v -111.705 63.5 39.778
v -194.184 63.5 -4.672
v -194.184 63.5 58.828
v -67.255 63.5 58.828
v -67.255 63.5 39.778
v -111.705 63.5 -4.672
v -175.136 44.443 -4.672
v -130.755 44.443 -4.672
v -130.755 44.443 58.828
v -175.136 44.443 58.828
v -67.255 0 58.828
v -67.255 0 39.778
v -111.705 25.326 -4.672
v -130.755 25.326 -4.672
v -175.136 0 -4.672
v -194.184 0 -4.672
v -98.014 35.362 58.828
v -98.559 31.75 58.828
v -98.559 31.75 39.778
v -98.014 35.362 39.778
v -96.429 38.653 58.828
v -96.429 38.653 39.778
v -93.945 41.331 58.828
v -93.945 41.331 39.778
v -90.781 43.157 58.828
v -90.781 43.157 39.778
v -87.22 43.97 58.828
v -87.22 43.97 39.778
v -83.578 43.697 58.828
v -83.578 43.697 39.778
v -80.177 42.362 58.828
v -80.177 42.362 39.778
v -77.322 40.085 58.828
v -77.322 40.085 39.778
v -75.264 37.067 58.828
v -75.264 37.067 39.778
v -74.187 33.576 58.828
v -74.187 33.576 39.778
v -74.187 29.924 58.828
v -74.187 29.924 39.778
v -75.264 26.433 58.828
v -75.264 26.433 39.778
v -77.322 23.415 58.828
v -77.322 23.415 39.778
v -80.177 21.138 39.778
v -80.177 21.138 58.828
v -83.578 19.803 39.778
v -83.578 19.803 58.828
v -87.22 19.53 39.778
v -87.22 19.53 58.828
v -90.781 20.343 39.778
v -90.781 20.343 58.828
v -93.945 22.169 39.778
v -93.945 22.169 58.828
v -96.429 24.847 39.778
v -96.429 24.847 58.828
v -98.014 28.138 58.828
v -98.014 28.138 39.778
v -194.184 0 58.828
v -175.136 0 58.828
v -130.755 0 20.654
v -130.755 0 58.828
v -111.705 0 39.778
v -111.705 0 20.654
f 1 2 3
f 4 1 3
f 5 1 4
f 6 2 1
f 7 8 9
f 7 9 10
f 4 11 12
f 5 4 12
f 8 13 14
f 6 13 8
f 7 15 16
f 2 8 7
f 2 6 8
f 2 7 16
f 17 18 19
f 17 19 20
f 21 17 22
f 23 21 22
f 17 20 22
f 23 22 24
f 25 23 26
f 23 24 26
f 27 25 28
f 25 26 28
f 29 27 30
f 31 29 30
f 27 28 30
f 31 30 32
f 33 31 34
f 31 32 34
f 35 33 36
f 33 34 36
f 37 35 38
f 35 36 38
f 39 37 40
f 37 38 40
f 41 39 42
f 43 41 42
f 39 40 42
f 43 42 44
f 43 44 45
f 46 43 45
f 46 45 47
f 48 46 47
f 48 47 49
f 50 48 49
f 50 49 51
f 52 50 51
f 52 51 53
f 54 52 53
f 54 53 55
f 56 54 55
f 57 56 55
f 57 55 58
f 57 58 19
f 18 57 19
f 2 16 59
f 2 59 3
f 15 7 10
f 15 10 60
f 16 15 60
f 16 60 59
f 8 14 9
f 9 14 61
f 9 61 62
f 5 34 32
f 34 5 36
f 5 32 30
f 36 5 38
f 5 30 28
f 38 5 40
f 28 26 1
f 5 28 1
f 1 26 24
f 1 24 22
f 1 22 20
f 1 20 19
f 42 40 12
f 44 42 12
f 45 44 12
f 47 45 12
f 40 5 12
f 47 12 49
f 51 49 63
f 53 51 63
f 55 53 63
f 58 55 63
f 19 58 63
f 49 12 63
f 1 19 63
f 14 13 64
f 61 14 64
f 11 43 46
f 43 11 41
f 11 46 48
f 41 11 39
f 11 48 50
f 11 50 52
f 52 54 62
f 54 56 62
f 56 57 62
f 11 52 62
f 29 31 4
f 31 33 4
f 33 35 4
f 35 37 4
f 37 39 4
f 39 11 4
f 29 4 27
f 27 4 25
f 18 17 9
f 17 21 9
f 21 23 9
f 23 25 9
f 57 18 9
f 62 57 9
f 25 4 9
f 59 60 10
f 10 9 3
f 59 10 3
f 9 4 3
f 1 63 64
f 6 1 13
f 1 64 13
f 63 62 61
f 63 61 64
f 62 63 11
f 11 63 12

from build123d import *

# Parameters (mm, degrees)
BOSS_EXTRUDE1_DEPTH = 63.5
BOSS_EXTRUDE2_DEPTH = 63.5
SKETCH6_R           = 12.254243907
CUT_EXTRUDE1_DEPTH  = 20.05
CUT_EXTRUDE2_DEPTH  = 19.05


with BuildPart() as part:
    # Sketch3 → Boss-Extrude1 (new body)
    with BuildSketch(Plane(origin=(0, 0, 0), x_dir=(1, 0, 0), z_dir=(0, 1, 0))):
        Polygon((-130.754517968, 4.672099354), (-130.754517968, -58.827900646), (-67.254517968, -58.827900646), (-67.254517968, -39.777900646), (-111.704517968, -39.777900646), (-111.704517968, 4.672099354), align=None)
    extrude(amount=BOSS_EXTRUDE1_DEPTH)

    # Sketch4 → Boss-Extrude2 (add)
    with BuildSketch(Plane(origin=(0, 0, -4.672099354), x_dir=(-1, 0, 0), z_dir=(0, 0, -1))):
        Polygon((130.754517968, 63.5), (130.754517968, 44.443431663), (175.135531737, 44.443431663), (175.135531737, 0), (194.183522013, 0), (194.183522013, 63.5), align=None)
    extrude(amount=-BOSS_EXTRUDE2_DEPTH)

    # Sketch6 → Cut-Extrude1 (cut, through all)
    with BuildSketch(Plane(origin=(0, 0, 39.777900646), x_dir=(-1, 0, 0), z_dir=(0, 0, -1))):
        with Locations((86.304517968, 31.75)):
            Circle(SKETCH6_R)
    extrude(amount=-CUT_EXTRUDE1_DEPTH, mode=Mode.SUBTRACT)

    # Sketch8 → Cut-Extrude2 (cut)
    with BuildSketch(Plane(origin=(-111.704517968, 0, 0), x_dir=(0, 0, -1), z_dir=(1, 0, 0))):
        Polygon((4.672099354, 0), (4.672099354, 25.326198551), (-20.654099197, 0), align=None)
    extrude(amount=-CUT_EXTRUDE2_DEPTH, mode=Mode.SUBTRACT)


solid = part.part
